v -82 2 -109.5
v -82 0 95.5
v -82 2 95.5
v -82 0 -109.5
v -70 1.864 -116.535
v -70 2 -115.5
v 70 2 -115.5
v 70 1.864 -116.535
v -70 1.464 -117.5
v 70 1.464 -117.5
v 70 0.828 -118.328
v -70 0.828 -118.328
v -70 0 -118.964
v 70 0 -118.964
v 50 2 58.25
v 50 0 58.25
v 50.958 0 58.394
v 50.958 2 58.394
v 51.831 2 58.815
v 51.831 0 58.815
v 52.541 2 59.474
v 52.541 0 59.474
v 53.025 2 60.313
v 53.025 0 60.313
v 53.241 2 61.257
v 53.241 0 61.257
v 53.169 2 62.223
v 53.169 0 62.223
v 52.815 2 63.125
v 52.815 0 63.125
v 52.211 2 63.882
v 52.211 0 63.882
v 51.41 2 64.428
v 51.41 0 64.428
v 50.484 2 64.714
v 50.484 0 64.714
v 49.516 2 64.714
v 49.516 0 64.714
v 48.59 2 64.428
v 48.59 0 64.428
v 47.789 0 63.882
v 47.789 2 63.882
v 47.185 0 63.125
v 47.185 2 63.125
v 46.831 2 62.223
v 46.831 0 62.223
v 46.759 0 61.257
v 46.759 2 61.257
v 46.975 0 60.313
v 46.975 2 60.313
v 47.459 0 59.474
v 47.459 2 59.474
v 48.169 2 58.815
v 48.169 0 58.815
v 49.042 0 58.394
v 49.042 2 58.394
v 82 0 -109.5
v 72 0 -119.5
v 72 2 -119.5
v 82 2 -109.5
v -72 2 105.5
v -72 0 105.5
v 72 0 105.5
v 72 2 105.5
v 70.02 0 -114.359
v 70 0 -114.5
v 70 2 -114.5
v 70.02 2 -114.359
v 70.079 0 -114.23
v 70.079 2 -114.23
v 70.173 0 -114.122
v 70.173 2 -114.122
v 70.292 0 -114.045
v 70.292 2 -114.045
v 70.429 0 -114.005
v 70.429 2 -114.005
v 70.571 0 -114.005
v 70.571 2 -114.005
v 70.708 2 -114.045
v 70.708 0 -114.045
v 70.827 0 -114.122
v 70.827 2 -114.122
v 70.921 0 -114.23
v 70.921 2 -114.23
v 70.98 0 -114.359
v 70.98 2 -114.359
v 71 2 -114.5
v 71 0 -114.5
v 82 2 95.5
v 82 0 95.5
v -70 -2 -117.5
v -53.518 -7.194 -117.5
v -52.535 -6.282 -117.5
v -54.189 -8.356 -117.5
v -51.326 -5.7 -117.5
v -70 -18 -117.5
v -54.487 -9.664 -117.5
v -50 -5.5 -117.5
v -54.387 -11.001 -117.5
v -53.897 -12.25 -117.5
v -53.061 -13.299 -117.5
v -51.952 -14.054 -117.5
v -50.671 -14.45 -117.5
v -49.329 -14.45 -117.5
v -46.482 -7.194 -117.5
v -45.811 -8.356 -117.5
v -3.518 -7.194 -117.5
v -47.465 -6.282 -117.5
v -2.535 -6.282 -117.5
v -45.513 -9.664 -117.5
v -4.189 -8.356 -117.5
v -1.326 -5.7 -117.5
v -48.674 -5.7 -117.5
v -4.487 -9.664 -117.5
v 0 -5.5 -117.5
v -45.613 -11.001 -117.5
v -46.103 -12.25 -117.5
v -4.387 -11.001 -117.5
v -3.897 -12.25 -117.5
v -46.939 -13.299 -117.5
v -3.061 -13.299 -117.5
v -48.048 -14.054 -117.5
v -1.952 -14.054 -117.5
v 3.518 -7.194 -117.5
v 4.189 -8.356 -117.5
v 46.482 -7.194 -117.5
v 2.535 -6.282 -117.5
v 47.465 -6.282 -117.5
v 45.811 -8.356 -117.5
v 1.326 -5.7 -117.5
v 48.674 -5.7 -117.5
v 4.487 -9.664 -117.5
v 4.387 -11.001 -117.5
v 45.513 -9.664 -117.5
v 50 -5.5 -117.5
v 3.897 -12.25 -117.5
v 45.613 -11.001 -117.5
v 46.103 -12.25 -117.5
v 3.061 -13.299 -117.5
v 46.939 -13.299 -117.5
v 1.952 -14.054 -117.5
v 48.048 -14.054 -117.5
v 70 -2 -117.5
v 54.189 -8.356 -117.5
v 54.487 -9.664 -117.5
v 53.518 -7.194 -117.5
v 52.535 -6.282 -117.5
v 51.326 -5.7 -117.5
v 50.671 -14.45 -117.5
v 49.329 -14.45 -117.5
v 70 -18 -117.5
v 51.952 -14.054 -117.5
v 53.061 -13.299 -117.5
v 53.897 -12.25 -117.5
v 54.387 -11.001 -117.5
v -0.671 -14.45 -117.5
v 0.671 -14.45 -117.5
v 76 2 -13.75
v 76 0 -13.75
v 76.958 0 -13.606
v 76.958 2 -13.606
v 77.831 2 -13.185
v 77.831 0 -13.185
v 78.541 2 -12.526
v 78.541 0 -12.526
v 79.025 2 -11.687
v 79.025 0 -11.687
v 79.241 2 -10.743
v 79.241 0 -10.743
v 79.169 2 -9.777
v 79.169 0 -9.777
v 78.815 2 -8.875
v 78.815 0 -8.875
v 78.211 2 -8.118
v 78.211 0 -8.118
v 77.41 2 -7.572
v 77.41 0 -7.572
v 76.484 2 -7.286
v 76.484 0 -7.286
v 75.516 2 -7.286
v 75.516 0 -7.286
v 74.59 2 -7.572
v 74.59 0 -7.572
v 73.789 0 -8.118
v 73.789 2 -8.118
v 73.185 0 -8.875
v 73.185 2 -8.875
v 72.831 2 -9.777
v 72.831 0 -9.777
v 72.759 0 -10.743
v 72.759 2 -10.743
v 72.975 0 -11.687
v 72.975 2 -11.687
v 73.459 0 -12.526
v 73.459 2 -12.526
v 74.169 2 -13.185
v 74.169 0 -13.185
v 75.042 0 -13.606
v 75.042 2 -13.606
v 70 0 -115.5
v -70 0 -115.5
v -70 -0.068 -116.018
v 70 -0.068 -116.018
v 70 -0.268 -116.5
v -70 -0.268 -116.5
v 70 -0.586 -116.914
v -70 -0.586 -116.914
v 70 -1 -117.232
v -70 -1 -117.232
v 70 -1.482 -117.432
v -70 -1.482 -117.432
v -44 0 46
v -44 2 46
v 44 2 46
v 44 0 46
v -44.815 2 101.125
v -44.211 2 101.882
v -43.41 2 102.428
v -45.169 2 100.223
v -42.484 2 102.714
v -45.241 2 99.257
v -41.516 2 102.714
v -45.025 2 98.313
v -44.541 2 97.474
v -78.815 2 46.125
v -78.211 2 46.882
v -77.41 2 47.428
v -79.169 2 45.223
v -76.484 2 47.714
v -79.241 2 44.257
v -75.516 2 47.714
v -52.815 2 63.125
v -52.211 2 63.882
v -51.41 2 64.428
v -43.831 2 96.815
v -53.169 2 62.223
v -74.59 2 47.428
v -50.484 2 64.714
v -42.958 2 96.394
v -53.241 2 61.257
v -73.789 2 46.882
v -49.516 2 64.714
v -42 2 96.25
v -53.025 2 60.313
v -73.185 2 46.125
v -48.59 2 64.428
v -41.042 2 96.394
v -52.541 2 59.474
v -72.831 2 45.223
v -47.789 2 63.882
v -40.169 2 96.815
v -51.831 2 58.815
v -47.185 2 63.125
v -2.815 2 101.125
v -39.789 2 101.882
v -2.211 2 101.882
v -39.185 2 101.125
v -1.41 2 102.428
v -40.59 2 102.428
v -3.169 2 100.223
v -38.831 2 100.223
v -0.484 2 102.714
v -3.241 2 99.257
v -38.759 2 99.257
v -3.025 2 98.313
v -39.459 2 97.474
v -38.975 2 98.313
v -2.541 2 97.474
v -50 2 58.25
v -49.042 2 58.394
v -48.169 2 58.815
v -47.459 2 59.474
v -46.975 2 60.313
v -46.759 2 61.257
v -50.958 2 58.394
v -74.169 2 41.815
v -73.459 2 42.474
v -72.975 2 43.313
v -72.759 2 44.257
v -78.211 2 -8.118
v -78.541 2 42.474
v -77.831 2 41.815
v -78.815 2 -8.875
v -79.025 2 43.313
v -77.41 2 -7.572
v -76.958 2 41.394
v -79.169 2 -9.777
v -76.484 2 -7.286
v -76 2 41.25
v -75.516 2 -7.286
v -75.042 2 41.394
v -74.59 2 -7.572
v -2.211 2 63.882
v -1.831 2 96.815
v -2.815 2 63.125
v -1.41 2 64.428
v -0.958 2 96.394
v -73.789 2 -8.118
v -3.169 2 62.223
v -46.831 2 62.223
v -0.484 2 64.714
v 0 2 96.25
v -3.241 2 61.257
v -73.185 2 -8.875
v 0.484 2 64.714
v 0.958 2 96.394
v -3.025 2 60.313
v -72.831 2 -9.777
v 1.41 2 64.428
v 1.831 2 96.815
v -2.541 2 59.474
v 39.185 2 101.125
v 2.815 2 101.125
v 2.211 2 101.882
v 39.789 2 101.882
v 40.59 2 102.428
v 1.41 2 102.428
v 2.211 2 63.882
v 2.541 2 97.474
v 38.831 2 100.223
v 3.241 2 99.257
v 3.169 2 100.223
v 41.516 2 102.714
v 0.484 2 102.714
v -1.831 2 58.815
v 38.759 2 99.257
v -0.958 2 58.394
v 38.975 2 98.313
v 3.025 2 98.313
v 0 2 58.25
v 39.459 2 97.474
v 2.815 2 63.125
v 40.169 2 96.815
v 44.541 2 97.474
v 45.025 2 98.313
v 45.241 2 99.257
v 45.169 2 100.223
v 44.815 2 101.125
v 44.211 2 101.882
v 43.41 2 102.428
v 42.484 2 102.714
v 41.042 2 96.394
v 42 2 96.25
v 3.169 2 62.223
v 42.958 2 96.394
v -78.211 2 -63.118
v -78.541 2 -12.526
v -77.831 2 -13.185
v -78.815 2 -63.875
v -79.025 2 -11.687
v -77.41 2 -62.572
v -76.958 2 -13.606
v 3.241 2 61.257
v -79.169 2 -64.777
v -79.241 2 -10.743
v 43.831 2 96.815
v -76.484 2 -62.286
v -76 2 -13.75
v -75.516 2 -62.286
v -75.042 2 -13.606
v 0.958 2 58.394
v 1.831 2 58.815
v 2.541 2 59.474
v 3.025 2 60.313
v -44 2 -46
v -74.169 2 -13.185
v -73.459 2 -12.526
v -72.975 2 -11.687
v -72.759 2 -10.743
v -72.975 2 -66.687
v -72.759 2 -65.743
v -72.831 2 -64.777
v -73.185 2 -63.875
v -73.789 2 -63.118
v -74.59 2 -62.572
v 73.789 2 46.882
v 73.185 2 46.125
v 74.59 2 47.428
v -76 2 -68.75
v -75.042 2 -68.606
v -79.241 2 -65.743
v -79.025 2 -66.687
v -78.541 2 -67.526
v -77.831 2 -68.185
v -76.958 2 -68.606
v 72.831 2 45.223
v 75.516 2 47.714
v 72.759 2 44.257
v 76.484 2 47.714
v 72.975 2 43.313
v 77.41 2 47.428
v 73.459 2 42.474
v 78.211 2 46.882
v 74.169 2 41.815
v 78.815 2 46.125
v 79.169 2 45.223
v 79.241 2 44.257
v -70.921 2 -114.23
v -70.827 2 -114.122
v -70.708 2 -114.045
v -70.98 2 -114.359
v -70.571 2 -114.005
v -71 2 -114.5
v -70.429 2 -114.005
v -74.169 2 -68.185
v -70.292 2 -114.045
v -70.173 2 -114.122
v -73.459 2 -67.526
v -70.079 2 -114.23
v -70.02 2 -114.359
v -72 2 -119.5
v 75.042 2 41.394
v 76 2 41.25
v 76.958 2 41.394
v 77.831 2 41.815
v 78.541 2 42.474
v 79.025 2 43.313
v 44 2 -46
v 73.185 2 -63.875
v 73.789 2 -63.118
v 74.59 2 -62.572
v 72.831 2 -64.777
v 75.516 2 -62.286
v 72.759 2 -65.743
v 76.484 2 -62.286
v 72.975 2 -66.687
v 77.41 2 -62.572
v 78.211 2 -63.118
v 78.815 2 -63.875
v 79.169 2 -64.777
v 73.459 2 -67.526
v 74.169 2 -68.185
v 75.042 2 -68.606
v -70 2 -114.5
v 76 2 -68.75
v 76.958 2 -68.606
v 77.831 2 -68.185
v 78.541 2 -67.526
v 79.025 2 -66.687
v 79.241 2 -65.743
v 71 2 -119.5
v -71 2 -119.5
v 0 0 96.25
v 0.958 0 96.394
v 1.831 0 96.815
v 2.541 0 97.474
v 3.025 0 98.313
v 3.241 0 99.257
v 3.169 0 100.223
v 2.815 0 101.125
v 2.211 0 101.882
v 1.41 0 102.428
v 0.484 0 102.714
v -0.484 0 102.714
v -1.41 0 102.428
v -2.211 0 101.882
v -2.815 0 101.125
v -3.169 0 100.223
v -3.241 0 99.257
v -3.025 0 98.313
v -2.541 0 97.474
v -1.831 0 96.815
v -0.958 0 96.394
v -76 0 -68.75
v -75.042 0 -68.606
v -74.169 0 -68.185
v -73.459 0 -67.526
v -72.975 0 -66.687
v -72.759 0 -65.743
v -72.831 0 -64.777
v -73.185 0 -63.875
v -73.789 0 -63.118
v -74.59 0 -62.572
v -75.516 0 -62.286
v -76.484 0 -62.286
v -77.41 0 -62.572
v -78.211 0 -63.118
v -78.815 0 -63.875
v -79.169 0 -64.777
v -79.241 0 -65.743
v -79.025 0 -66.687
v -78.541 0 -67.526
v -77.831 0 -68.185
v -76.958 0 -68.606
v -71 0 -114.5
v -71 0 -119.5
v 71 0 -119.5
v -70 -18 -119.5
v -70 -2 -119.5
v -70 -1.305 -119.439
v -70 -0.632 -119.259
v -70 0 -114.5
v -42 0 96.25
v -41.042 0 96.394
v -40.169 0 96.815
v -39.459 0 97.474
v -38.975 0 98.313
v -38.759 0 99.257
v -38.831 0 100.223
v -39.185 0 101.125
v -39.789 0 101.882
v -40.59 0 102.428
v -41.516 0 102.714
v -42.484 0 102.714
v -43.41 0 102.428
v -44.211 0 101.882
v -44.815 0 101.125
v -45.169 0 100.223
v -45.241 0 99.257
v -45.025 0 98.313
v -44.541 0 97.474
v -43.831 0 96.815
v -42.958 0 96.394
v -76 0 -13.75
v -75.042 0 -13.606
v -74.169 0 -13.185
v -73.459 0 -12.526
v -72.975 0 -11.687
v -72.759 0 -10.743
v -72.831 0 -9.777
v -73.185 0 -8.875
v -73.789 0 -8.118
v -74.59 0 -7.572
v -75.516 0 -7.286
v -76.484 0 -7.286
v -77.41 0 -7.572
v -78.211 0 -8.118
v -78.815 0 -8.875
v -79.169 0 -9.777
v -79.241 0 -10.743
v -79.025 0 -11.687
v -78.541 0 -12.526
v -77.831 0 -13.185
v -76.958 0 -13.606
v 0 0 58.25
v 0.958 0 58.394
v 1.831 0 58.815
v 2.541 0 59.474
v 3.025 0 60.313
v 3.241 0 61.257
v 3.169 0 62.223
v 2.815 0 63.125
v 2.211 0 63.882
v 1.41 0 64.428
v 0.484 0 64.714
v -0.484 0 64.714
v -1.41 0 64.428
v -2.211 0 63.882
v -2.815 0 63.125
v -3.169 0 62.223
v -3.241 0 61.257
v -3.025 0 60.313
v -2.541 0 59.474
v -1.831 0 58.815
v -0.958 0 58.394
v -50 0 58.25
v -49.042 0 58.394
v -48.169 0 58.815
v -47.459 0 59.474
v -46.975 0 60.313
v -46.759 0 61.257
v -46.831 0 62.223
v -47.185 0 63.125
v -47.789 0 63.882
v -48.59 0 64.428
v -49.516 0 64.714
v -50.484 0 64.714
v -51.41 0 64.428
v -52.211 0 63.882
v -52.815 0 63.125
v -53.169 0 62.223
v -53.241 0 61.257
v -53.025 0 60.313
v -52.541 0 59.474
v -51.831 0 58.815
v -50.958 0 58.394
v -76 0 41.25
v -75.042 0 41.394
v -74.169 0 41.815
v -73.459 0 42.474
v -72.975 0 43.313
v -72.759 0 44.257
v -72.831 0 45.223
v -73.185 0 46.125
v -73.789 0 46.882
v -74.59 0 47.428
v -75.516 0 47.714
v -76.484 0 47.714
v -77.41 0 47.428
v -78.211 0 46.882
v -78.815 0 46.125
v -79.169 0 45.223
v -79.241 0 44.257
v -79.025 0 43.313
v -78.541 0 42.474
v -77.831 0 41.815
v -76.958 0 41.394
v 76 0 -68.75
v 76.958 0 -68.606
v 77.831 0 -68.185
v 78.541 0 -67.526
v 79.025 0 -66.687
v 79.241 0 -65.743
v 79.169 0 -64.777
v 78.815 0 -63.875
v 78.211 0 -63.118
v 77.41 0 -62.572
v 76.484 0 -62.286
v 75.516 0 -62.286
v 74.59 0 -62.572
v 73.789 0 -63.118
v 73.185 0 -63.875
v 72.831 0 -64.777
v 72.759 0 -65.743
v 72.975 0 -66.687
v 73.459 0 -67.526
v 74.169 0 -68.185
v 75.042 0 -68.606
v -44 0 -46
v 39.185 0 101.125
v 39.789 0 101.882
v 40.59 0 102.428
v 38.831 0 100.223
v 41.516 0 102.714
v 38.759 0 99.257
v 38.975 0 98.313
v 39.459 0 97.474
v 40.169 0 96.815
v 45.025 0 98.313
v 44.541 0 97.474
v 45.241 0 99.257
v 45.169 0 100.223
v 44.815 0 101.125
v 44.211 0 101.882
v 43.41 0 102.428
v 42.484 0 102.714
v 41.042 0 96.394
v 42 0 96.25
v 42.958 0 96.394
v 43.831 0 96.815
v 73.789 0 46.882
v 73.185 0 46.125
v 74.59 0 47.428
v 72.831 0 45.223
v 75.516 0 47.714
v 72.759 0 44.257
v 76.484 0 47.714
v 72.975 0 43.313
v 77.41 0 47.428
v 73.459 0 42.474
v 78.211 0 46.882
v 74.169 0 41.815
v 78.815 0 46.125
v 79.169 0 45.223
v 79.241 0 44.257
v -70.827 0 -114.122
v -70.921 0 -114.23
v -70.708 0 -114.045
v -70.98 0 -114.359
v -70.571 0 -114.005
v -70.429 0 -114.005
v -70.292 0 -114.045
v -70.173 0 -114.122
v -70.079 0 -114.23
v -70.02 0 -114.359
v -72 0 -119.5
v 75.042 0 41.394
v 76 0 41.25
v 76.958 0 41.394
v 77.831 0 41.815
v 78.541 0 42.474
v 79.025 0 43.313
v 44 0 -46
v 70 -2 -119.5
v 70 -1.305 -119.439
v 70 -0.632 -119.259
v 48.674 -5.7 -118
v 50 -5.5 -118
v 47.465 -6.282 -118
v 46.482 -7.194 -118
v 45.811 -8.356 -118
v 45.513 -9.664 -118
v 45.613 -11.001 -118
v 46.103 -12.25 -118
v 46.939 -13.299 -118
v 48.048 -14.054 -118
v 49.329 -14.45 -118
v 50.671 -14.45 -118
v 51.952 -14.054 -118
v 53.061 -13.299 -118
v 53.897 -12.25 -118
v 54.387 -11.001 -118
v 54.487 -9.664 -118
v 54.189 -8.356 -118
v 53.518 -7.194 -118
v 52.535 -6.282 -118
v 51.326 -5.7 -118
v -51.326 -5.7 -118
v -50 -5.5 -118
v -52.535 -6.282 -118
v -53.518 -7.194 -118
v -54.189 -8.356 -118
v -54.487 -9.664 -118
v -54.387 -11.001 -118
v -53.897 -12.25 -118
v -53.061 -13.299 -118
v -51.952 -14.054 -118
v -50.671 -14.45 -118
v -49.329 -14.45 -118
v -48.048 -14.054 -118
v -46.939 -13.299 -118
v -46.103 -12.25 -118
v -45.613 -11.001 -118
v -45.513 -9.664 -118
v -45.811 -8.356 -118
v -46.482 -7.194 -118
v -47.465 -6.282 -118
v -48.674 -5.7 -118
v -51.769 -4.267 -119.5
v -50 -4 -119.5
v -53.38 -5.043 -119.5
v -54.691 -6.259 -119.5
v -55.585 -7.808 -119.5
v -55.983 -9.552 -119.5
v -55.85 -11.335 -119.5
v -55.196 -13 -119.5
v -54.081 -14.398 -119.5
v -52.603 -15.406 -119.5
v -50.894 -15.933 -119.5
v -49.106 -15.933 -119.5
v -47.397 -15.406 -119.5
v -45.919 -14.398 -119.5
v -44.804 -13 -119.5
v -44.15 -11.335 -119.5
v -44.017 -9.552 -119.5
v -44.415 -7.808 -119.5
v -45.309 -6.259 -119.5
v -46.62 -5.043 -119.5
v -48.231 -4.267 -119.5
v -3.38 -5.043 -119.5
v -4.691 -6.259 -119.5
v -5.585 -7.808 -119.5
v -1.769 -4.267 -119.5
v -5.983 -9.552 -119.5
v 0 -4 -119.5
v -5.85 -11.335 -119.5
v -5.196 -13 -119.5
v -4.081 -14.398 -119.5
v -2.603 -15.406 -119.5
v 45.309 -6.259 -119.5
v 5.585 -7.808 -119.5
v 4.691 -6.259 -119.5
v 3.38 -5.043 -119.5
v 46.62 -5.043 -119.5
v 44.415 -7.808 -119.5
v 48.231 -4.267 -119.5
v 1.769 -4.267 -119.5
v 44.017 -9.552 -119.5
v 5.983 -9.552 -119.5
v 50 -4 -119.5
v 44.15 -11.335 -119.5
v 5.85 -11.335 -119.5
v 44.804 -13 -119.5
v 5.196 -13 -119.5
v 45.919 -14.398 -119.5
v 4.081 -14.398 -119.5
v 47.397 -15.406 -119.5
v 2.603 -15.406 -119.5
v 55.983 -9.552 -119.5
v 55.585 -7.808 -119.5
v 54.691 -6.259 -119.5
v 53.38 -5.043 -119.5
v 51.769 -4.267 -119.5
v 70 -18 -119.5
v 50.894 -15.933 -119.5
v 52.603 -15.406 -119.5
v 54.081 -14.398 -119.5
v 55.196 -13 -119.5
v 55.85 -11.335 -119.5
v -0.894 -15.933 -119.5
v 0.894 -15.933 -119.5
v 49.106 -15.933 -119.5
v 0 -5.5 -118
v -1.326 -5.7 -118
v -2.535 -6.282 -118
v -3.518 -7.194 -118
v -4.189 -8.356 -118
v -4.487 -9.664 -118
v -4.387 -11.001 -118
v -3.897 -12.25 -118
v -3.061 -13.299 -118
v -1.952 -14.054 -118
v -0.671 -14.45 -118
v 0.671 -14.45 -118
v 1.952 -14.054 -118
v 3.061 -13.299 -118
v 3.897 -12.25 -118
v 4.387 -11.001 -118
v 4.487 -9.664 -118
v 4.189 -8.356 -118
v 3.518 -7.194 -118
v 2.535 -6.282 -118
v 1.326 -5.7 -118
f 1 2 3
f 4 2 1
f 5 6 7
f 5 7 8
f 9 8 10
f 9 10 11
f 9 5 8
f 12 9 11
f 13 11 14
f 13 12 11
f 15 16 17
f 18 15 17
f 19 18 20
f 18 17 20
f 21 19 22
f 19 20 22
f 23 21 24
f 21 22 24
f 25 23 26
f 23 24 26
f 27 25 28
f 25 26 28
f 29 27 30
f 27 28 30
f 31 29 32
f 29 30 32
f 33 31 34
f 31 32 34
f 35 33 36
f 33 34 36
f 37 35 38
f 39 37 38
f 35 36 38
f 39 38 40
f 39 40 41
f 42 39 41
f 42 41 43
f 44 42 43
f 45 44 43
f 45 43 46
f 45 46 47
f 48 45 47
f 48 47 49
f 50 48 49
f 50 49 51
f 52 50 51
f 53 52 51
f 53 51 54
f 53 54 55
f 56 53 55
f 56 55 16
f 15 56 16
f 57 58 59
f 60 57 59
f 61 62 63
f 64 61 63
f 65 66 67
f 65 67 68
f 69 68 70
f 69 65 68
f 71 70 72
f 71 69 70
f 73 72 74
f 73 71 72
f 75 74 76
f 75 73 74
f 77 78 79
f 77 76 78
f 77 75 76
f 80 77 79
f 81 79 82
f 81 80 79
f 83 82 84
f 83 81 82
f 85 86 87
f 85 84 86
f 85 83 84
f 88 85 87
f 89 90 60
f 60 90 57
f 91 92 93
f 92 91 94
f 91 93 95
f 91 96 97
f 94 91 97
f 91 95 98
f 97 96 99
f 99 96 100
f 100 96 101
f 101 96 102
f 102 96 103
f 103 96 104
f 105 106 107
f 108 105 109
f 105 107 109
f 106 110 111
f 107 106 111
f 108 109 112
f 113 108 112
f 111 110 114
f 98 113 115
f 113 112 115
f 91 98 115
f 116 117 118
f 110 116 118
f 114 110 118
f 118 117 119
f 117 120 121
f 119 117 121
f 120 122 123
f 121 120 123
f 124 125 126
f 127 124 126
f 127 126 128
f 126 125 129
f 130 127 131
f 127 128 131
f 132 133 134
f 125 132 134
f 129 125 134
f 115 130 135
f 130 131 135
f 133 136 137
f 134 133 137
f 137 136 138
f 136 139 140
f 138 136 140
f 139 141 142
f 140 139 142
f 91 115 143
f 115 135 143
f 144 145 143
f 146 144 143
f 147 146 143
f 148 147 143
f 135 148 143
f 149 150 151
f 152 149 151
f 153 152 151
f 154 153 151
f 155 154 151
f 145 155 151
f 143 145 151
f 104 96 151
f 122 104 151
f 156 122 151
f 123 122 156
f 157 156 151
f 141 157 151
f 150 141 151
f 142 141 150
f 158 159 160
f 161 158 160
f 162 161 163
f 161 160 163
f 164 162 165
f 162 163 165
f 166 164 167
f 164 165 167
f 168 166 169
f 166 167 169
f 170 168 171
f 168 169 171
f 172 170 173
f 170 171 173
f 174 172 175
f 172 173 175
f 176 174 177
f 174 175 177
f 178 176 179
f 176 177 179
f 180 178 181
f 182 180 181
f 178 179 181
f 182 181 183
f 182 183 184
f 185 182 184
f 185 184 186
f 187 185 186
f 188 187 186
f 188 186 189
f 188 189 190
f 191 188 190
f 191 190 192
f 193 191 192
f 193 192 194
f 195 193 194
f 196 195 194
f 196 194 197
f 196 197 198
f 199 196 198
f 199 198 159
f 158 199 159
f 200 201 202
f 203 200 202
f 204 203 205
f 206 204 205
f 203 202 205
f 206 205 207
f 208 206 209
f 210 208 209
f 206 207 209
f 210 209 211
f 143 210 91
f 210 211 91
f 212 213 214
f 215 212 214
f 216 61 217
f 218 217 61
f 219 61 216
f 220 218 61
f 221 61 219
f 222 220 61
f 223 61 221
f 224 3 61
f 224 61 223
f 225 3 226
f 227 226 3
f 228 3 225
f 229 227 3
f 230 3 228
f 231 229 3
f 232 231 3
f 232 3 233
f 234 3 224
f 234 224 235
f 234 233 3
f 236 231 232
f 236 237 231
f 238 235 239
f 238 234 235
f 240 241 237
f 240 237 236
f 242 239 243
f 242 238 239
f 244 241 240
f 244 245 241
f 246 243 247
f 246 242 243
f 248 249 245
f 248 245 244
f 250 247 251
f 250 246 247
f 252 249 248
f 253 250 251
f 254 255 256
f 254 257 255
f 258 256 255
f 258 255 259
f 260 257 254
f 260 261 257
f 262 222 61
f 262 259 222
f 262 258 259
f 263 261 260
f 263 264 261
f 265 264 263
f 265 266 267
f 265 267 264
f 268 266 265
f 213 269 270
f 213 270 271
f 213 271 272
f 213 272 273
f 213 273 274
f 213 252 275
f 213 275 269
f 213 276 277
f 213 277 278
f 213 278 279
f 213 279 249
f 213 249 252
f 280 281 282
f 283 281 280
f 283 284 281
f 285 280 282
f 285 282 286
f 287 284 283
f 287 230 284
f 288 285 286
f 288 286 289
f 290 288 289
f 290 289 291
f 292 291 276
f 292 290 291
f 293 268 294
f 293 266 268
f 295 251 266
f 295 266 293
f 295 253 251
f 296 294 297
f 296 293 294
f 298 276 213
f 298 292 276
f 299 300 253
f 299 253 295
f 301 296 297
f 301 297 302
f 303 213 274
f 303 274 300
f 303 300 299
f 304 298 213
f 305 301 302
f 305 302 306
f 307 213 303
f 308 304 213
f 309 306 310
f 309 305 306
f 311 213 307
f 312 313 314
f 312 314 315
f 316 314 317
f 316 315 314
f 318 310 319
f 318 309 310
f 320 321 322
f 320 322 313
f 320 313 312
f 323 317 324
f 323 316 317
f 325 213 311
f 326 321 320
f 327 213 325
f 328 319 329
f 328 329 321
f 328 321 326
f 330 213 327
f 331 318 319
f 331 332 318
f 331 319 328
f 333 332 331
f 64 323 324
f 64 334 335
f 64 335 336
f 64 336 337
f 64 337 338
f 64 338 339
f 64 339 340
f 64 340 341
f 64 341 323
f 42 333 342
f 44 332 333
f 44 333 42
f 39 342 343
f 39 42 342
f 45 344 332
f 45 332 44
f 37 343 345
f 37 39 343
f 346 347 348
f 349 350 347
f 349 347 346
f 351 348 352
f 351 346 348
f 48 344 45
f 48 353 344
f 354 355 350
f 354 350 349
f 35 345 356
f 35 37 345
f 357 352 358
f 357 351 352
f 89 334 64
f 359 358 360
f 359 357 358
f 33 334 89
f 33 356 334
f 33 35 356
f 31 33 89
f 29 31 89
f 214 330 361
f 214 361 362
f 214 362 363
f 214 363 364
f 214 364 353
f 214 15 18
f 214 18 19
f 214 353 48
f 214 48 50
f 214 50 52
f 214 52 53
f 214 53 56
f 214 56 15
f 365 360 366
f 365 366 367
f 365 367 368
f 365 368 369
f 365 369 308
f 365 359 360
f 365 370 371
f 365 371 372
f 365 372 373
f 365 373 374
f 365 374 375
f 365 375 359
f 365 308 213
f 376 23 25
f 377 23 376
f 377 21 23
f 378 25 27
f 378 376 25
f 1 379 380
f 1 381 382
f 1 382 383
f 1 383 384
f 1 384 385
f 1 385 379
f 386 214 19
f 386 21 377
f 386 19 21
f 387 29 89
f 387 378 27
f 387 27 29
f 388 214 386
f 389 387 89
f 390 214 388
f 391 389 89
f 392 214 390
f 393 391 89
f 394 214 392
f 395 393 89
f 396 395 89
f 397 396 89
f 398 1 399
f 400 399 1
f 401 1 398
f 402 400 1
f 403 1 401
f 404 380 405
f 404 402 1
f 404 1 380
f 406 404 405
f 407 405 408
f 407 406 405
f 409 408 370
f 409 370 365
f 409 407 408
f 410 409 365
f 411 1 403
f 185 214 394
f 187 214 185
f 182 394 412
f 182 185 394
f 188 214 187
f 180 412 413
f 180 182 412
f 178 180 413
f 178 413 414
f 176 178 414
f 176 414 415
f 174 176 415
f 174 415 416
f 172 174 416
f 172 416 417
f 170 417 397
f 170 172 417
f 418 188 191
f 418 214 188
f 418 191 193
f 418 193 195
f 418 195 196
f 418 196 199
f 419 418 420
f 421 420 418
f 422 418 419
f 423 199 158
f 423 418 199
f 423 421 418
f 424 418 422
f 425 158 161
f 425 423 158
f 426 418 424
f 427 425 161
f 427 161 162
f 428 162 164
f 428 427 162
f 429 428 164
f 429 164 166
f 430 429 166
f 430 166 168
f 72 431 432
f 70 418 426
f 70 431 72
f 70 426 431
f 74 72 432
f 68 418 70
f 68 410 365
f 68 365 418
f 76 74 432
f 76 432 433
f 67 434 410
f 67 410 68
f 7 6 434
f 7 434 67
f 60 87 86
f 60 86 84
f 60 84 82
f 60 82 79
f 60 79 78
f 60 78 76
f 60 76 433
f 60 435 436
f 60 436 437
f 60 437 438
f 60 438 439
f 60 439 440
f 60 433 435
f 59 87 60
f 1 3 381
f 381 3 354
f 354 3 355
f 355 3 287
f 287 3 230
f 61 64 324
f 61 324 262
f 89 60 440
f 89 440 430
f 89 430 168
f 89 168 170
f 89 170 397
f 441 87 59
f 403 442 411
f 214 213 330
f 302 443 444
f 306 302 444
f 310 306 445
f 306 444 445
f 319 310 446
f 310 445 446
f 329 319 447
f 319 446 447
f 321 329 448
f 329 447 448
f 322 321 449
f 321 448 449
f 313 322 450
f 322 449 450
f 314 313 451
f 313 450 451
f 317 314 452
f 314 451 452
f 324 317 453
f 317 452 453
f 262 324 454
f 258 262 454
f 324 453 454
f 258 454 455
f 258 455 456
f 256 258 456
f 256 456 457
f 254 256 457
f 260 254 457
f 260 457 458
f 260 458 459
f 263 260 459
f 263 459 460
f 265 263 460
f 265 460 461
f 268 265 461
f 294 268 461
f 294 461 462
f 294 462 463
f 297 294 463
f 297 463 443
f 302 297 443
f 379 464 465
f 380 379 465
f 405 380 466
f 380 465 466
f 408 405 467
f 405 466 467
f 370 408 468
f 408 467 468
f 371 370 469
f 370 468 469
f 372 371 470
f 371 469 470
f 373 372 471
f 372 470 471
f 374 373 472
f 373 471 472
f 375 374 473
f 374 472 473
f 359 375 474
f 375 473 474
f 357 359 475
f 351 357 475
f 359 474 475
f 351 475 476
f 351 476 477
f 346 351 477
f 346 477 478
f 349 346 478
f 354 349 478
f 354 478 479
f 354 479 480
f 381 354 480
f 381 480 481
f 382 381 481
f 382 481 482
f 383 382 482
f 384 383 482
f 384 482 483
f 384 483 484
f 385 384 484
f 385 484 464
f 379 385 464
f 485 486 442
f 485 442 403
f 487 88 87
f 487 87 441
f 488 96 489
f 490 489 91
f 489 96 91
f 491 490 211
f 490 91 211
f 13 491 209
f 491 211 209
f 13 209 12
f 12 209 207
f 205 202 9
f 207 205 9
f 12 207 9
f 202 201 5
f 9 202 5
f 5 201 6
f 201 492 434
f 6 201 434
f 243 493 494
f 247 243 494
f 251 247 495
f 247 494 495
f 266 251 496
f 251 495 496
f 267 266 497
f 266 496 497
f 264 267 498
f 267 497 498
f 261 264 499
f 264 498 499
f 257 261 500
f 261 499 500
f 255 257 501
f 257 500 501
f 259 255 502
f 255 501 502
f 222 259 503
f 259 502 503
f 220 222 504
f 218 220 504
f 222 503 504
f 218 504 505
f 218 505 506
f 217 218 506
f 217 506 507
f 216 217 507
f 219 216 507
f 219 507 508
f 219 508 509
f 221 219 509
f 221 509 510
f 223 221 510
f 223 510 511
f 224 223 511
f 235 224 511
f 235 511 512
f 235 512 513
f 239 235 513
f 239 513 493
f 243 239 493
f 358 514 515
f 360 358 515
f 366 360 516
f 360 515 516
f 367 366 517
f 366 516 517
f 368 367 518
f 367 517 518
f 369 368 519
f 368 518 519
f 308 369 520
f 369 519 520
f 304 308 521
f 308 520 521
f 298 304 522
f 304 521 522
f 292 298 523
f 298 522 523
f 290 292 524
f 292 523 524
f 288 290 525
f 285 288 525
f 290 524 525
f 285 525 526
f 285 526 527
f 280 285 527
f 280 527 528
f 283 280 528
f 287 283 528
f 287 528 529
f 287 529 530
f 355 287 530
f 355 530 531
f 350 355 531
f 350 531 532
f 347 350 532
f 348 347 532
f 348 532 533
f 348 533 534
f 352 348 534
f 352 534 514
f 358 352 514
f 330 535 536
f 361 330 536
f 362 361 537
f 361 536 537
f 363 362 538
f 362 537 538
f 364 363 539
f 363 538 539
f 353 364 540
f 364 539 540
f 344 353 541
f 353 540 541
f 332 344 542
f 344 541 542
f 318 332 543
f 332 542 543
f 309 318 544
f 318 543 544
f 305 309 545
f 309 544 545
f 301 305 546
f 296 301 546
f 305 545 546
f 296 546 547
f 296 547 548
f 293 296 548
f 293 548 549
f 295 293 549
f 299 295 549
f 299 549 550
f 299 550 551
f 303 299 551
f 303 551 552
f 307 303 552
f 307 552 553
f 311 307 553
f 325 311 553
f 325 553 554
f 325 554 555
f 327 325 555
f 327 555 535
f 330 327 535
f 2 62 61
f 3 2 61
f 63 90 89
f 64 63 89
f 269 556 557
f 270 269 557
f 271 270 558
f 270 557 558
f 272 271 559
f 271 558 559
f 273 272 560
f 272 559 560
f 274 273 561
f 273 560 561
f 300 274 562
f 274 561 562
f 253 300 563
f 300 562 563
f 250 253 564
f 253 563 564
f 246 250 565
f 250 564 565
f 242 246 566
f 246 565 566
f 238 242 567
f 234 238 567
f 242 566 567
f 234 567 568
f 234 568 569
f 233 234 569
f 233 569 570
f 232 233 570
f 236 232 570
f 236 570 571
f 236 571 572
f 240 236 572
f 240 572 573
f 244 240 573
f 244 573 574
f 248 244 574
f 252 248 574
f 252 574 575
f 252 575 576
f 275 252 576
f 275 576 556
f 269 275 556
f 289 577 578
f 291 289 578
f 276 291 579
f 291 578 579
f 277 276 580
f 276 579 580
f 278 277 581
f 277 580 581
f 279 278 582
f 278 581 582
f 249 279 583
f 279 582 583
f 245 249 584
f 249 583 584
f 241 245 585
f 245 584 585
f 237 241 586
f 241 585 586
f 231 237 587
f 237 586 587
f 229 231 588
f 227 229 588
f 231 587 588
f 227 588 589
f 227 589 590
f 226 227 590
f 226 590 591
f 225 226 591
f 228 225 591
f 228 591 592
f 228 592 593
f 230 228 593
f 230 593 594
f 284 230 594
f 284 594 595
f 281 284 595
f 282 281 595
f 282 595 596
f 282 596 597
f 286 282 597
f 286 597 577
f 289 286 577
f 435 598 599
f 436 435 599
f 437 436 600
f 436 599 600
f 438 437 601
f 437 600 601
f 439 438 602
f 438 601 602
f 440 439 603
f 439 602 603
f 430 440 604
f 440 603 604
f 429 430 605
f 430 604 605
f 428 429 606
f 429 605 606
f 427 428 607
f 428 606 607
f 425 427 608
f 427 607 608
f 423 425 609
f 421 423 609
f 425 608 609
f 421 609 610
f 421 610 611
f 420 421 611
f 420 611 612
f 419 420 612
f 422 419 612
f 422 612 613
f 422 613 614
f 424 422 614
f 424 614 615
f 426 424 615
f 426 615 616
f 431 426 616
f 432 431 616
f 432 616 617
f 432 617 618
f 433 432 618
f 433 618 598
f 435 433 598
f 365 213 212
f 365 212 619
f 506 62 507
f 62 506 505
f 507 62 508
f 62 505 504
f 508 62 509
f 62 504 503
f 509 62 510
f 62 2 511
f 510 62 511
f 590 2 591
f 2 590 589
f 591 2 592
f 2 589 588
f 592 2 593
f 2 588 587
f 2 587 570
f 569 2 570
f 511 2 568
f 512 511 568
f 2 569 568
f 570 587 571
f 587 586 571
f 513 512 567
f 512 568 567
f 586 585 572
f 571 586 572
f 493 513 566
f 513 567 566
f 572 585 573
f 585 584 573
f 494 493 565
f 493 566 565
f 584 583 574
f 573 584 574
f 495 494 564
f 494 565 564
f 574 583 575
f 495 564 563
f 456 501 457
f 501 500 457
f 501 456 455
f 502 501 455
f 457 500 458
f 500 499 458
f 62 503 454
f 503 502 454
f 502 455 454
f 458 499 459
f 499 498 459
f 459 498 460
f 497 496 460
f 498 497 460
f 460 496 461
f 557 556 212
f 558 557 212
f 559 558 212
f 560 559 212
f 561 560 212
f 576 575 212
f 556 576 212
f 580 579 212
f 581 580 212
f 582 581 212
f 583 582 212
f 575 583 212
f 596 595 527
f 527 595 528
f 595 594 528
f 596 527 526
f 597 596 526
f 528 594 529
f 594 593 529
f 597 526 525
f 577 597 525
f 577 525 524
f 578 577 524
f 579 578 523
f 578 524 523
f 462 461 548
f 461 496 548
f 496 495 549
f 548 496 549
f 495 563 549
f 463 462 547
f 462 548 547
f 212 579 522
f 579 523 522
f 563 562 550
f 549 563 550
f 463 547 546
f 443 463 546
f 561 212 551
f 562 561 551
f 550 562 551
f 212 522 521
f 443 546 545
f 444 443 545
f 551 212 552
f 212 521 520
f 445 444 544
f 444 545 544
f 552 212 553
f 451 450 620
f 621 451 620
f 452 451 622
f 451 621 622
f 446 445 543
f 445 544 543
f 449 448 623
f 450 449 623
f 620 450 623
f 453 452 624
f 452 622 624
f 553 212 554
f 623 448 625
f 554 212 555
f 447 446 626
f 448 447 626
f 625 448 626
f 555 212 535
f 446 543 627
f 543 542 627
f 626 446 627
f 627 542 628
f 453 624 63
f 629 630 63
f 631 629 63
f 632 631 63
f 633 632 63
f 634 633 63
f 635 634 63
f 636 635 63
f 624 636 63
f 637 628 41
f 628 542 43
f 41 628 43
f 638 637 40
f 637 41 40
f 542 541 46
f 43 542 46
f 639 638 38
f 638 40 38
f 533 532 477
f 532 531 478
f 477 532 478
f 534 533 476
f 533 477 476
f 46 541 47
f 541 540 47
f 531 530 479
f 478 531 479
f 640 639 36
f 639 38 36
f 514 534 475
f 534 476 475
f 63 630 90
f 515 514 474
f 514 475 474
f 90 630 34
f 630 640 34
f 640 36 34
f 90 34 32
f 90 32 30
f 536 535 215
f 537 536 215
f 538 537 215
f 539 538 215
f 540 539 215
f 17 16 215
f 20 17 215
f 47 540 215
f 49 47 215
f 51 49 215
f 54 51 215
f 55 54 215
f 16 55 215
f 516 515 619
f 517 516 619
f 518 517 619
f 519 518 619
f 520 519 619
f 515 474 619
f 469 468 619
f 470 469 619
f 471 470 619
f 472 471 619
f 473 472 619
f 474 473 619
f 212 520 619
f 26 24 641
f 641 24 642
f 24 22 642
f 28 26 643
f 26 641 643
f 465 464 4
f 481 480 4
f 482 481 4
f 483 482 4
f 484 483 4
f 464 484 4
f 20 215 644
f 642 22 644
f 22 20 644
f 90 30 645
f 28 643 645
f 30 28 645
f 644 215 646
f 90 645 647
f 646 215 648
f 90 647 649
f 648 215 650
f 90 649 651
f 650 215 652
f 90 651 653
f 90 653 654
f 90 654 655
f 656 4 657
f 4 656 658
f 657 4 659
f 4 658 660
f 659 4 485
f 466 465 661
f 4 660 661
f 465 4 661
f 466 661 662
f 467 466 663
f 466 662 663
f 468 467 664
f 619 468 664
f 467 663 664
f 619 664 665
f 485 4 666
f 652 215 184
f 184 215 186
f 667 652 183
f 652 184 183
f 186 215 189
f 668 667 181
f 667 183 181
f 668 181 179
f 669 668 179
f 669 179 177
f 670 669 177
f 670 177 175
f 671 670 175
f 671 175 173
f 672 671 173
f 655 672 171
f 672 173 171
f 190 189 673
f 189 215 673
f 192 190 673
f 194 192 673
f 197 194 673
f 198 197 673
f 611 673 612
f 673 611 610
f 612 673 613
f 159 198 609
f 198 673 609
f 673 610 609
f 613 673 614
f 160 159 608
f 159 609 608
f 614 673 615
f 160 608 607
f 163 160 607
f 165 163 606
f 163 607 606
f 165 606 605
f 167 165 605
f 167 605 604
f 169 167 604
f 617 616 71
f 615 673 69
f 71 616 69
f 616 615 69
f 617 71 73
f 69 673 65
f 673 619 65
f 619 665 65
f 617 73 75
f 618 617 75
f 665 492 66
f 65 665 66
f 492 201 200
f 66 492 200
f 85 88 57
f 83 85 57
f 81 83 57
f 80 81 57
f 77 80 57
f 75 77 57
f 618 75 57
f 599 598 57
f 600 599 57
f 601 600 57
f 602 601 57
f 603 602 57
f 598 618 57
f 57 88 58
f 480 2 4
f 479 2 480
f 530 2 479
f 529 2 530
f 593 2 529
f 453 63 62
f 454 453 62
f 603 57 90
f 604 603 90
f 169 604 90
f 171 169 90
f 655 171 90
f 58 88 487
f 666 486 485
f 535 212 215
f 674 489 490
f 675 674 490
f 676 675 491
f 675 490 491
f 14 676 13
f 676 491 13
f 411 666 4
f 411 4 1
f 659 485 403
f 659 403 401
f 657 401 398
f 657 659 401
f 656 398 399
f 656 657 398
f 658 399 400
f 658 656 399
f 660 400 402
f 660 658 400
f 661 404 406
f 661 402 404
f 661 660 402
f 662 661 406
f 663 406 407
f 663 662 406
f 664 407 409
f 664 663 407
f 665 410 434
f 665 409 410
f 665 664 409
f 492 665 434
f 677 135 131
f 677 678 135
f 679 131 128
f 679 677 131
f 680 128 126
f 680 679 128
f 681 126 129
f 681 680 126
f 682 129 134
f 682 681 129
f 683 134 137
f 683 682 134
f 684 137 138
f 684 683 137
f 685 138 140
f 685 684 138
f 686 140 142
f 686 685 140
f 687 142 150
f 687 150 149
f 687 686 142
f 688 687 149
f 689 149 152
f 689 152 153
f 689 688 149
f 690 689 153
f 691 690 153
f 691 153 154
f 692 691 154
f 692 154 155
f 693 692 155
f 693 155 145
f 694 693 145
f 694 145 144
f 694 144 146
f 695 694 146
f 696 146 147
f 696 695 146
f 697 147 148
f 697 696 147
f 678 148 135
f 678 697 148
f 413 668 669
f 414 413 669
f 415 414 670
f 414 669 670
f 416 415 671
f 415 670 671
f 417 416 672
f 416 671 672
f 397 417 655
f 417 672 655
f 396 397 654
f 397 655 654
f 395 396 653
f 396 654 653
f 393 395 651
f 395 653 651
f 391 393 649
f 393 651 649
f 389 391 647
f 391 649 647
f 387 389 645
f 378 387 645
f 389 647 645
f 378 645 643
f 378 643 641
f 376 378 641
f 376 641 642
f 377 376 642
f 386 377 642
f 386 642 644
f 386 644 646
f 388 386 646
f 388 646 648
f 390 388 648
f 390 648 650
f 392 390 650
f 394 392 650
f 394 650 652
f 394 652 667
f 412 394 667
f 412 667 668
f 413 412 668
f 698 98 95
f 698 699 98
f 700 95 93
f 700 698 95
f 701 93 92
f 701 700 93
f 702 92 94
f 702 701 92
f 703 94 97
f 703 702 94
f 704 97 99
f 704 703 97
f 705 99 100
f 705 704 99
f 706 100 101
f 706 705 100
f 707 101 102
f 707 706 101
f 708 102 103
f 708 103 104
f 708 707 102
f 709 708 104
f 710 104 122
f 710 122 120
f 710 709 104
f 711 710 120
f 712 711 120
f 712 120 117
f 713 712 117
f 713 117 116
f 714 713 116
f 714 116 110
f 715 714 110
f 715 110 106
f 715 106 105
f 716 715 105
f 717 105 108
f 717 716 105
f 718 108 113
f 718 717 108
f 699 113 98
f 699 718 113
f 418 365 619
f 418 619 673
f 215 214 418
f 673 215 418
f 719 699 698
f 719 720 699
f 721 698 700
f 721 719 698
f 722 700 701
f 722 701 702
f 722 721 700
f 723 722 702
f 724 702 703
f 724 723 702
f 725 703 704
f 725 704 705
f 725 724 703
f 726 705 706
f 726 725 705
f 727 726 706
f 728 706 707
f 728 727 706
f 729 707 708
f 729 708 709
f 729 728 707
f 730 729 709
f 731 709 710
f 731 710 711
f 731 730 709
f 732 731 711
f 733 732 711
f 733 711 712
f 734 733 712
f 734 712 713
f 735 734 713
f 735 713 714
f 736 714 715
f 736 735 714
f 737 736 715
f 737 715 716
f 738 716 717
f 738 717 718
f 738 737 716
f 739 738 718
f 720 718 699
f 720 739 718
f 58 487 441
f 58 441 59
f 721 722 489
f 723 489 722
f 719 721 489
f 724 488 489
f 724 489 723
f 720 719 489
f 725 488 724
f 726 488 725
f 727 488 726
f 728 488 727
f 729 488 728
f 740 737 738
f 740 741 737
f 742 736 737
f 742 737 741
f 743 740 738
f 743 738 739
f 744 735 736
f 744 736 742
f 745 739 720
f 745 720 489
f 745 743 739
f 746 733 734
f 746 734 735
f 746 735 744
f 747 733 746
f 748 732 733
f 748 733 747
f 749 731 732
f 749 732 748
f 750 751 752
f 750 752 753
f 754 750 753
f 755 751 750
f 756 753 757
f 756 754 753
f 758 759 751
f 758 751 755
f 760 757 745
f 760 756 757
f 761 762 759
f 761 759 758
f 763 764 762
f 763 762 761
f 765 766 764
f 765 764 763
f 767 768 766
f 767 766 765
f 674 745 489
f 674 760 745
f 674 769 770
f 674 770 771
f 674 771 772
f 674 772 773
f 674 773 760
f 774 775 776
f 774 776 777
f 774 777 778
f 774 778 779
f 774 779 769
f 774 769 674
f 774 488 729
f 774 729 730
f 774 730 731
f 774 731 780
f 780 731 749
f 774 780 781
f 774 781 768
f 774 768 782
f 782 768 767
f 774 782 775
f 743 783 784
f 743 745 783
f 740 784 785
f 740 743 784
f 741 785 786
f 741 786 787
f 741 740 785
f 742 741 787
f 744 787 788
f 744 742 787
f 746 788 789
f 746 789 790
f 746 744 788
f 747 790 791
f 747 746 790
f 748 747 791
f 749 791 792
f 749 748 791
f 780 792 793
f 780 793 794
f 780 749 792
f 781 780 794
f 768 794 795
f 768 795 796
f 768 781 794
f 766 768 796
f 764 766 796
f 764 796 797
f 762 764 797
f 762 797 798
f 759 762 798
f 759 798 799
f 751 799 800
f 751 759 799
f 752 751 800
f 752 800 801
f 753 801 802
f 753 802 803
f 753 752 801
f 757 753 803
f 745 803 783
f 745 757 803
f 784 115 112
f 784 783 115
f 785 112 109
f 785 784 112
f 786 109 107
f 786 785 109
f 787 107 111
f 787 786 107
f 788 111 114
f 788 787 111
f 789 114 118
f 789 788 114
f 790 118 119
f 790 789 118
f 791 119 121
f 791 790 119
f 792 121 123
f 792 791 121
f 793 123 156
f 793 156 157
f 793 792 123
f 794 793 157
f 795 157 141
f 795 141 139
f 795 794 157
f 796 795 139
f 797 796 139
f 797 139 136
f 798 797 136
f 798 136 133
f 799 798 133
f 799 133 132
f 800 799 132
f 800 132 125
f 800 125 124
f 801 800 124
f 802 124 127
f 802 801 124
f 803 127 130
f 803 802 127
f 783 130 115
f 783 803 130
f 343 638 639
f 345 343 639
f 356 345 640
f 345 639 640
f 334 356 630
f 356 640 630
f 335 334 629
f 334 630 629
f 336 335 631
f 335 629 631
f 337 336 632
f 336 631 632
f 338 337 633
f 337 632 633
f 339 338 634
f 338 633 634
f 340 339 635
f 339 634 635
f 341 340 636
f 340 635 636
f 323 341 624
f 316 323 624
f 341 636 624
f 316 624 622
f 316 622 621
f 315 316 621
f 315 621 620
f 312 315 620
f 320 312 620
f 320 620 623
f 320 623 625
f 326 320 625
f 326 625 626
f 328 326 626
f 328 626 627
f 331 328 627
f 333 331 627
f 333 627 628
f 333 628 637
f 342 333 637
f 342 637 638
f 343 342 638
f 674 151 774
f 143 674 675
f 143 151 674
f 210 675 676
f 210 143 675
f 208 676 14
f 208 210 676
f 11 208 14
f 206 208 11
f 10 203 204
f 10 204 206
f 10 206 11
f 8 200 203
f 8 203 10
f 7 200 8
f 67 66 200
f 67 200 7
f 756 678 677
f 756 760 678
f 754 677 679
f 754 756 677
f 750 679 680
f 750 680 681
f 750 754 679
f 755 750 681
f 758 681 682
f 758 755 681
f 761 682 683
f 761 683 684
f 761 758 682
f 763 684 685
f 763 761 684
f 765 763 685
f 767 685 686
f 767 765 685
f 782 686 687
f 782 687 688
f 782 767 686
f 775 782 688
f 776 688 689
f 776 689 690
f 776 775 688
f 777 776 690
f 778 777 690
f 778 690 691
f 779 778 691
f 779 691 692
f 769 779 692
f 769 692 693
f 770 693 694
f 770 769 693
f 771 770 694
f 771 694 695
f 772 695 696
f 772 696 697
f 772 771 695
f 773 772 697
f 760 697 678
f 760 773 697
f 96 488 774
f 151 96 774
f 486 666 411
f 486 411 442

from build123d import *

# Parameters (mm, degrees)
SKETCH_1_W                   = 164
SKETCH_1_H                   = 225
SM_BASE_FLANGE_1_DEPTH       = 2
SM_START                     = -2
SM_EDGE_FLANGE_1_DEPTH       = 5
SM_START_2                   = -18
SM_EDGE_FLANGE_1_2_OUTLINE_W = 140
SM_EDGE_FLANGE_1_2_OUTLINE_H = 2
SM_EDGE_FLANGE_1_2_DEPTH     = 16
SM_START_3                   = -70
SM_EDGE_FLANGE_1_3_DEPTH     = 140
SM_EDGE_FLANGE_1_4_DEPTH     = 140
HOLE_WIZARD_M61_AT_2_COUNT   = 2
HOLE_WIZARD_M61_AT_2_PITCH   = 50
HOLE_WIZARD_M61_AT_3_COUNT   = 2
HOLE_WIZARD_M61_AT_3_PITCH   = 50
HOLE_WIZARD_M61_2_D          = 6.5
CUT_EXTRUDE_1_REACH          = 148.302
SKETCH_10_W                  = 88
SKETCH_10_H                  = 92
CHAMFER_1_SIZE               = 10


with BuildPart() as part:
    # Базовая кромка1: sheet metal written as solids
    # Sketch 1 → Базовая кромка1 (new body)
    with BuildSketch(Plane(origin=(0, 0, 0), x_dir=(1, 0, 0), z_dir=(0, 1, 0))):
        with Locations((0, 7)):
            Rectangle(SKETCH_1_W, SKETCH_1_H)
    extrude(amount=SM_BASE_FLANGE_1_DEPTH)

    # Ребро-кромка1: read off the stored shape, not the designer's step
    # Ребро-кромка1 outline → Ребро-кромка1 (cut)
    with BuildSketch(Plane(origin=(0, 0, 0), x_dir=(1, 0, 0), z_dir=(0, 1, 0)).offset(SM_START)):
        with BuildLine():
            Line((-70, 114.5), (-70, 119.5))
            Line((-70, 119.5), (-71, 119.5))
            Line((-71, 119.5), (-71, 114.5))
            ThreePointArc((-71, 114.5), (-70.5, 114), (-70, 114.5))
        make_face()
        with BuildLine():
            Line((71, 119.5), (70, 119.5))
            Line((70, 119.5), (70, 114.5))
            ThreePointArc((70, 114.5), (70.5, 114), (71, 114.5))
            Line((71, 114.5), (71, 119.5))
        make_face()
    extrude(amount=SM_EDGE_FLANGE_1_DEPTH, mode=Mode.SUBTRACT)

    # Sm Edge Flange 1 3 outline → Sm Edge Flange 1 3 (cut)
    with BuildSketch(Plane.YZ.offset(SM_START_3)):
        with BuildLine():
            ThreePointArc((2, -115.5), (1.464101615, -117.5), (0, -118.964101616))
            Line((0, -118.964101616), (0, -119.5))
            Line((0, -119.5), (2, -119.5))
            Line((2, -119.5), (2, -115.5))
        make_face()
    extrude(amount=SM_EDGE_FLANGE_1_3_DEPTH, mode=Mode.SUBTRACT)



with BuildPart() as body_2:
    # Sm Edge Flange 1 2 outline → Sm Edge Flange 1 2 (new body)
    with BuildSketch(Plane(origin=(0, 0, 0), x_dir=(1, 0, 0), z_dir=(0, 1, 0)).offset(SM_START_2)):
        with Locations((0, 118.5)):
            Rectangle(SM_EDGE_FLANGE_1_2_OUTLINE_W, SM_EDGE_FLANGE_1_2_OUTLINE_H)
    extrude(amount=SM_EDGE_FLANGE_1_2_DEPTH)


with BuildPart() as part_1:
    add(part.part)

    add(body_2.part)  # Sm Edge Flange 1 4 merges body 2
    # Sm Edge Flange 1 4 outline → Sm Edge Flange 1 4 (add)
    with BuildSketch(Plane.YZ.offset(SM_START_3)):
        with BuildLine():
            Line((-2, -117.5), (-2, -119.5))
            ThreePointArc((-2, -119.5), (-0.96472382, -119.363703305), (0, -118.964101616))
            Line((0, -118.964101616), (0, -115.5))
            ThreePointArc((0, -115.5), (-0.585786438, -116.914213562), (-2, -117.5))
        make_face()
    extrude(amount=SM_EDGE_FLANGE_1_4_DEPTH)

    # Эскиз7 → Hole Wizard M61 (revolve, cut)
    with BuildSketch(Plane(origin=(0, -10, -119.5), x_dir=(0, 1, 0), z_dir=(1, 0, 0))):
        Polygon((0, 0), (0, 2), (4.5, 2), (4.5, 1.5), (6, 0), align=None)
    hole_wizard_m61 = revolve(axis=Axis((0, -10, -125.85), (0, 0, 1)), mode=Mode.SUBTRACT)

    # Hole Wizard M61 at 2: Hole Wizard M61 ×2
    with Locations(*[(i * HOLE_WIZARD_M61_AT_2_PITCH, 0, 0) for i in range(1, HOLE_WIZARD_M61_AT_2_COUNT)]):
        add(hole_wizard_m61, mode=Mode.SUBTRACT)

    # Hole Wizard M61 at 3: Hole Wizard M61 ×2
    with Locations(*[(-i * HOLE_WIZARD_M61_AT_3_PITCH, 0, 0) for i in range(1, HOLE_WIZARD_M61_AT_3_COUNT)]):
        add(hole_wizard_m61, mode=Mode.SUBTRACT)

    # Hole Wizard M61 2 (through all)
    with Locations(Plane(origin=(-76, 2, 44.5), x_dir=(0, 0, 1), z_dir=(0, 1, 0))):
        with Locations((0, 0), (-110, 0), (-110, 152), (0, 152), (17, 126), (17, 26), (55, 34), (55, 118), (55, 76), (17, 76), (-55, 152), (-55, 0)):
            Hole(HOLE_WIZARD_M61_2_D / 2)

    # Эскиз10 → Вытянуть1 (cut, up to next)
    with BuildSketch(Plane(origin=(0, 2, 0), x_dir=(1, 0, 0), z_dir=(0, 1, 0)), mode=Mode.PRIVATE) as cut_extrude_1_sk1:
        Rectangle(SKETCH_10_W, SKETCH_10_H)
    cut_extrude_1_tool1 = extrude(cut_extrude_1_sk1.sketch, amount=-CUT_EXTRUDE_1_REACH, mode=Mode.PRIVATE) & part_1.part
    add(cut_extrude_1_tool1.solids().sort_by_distance((0, 2, 0))[0], mode=Mode.SUBTRACT)

    # Фаска1
    chamfer_1_edges = [part_1.edges().sort_by_distance(p)[0] for p in [
        (-82, 1, -119.5),
        (82, 1, -119.5),
        (82, 1, 105.5),
        (-82, 1, 105.5),
    ]]
    chamfer(chamfer_1_edges, length=CHAMFER_1_SIZE)


solid = part_1.part
